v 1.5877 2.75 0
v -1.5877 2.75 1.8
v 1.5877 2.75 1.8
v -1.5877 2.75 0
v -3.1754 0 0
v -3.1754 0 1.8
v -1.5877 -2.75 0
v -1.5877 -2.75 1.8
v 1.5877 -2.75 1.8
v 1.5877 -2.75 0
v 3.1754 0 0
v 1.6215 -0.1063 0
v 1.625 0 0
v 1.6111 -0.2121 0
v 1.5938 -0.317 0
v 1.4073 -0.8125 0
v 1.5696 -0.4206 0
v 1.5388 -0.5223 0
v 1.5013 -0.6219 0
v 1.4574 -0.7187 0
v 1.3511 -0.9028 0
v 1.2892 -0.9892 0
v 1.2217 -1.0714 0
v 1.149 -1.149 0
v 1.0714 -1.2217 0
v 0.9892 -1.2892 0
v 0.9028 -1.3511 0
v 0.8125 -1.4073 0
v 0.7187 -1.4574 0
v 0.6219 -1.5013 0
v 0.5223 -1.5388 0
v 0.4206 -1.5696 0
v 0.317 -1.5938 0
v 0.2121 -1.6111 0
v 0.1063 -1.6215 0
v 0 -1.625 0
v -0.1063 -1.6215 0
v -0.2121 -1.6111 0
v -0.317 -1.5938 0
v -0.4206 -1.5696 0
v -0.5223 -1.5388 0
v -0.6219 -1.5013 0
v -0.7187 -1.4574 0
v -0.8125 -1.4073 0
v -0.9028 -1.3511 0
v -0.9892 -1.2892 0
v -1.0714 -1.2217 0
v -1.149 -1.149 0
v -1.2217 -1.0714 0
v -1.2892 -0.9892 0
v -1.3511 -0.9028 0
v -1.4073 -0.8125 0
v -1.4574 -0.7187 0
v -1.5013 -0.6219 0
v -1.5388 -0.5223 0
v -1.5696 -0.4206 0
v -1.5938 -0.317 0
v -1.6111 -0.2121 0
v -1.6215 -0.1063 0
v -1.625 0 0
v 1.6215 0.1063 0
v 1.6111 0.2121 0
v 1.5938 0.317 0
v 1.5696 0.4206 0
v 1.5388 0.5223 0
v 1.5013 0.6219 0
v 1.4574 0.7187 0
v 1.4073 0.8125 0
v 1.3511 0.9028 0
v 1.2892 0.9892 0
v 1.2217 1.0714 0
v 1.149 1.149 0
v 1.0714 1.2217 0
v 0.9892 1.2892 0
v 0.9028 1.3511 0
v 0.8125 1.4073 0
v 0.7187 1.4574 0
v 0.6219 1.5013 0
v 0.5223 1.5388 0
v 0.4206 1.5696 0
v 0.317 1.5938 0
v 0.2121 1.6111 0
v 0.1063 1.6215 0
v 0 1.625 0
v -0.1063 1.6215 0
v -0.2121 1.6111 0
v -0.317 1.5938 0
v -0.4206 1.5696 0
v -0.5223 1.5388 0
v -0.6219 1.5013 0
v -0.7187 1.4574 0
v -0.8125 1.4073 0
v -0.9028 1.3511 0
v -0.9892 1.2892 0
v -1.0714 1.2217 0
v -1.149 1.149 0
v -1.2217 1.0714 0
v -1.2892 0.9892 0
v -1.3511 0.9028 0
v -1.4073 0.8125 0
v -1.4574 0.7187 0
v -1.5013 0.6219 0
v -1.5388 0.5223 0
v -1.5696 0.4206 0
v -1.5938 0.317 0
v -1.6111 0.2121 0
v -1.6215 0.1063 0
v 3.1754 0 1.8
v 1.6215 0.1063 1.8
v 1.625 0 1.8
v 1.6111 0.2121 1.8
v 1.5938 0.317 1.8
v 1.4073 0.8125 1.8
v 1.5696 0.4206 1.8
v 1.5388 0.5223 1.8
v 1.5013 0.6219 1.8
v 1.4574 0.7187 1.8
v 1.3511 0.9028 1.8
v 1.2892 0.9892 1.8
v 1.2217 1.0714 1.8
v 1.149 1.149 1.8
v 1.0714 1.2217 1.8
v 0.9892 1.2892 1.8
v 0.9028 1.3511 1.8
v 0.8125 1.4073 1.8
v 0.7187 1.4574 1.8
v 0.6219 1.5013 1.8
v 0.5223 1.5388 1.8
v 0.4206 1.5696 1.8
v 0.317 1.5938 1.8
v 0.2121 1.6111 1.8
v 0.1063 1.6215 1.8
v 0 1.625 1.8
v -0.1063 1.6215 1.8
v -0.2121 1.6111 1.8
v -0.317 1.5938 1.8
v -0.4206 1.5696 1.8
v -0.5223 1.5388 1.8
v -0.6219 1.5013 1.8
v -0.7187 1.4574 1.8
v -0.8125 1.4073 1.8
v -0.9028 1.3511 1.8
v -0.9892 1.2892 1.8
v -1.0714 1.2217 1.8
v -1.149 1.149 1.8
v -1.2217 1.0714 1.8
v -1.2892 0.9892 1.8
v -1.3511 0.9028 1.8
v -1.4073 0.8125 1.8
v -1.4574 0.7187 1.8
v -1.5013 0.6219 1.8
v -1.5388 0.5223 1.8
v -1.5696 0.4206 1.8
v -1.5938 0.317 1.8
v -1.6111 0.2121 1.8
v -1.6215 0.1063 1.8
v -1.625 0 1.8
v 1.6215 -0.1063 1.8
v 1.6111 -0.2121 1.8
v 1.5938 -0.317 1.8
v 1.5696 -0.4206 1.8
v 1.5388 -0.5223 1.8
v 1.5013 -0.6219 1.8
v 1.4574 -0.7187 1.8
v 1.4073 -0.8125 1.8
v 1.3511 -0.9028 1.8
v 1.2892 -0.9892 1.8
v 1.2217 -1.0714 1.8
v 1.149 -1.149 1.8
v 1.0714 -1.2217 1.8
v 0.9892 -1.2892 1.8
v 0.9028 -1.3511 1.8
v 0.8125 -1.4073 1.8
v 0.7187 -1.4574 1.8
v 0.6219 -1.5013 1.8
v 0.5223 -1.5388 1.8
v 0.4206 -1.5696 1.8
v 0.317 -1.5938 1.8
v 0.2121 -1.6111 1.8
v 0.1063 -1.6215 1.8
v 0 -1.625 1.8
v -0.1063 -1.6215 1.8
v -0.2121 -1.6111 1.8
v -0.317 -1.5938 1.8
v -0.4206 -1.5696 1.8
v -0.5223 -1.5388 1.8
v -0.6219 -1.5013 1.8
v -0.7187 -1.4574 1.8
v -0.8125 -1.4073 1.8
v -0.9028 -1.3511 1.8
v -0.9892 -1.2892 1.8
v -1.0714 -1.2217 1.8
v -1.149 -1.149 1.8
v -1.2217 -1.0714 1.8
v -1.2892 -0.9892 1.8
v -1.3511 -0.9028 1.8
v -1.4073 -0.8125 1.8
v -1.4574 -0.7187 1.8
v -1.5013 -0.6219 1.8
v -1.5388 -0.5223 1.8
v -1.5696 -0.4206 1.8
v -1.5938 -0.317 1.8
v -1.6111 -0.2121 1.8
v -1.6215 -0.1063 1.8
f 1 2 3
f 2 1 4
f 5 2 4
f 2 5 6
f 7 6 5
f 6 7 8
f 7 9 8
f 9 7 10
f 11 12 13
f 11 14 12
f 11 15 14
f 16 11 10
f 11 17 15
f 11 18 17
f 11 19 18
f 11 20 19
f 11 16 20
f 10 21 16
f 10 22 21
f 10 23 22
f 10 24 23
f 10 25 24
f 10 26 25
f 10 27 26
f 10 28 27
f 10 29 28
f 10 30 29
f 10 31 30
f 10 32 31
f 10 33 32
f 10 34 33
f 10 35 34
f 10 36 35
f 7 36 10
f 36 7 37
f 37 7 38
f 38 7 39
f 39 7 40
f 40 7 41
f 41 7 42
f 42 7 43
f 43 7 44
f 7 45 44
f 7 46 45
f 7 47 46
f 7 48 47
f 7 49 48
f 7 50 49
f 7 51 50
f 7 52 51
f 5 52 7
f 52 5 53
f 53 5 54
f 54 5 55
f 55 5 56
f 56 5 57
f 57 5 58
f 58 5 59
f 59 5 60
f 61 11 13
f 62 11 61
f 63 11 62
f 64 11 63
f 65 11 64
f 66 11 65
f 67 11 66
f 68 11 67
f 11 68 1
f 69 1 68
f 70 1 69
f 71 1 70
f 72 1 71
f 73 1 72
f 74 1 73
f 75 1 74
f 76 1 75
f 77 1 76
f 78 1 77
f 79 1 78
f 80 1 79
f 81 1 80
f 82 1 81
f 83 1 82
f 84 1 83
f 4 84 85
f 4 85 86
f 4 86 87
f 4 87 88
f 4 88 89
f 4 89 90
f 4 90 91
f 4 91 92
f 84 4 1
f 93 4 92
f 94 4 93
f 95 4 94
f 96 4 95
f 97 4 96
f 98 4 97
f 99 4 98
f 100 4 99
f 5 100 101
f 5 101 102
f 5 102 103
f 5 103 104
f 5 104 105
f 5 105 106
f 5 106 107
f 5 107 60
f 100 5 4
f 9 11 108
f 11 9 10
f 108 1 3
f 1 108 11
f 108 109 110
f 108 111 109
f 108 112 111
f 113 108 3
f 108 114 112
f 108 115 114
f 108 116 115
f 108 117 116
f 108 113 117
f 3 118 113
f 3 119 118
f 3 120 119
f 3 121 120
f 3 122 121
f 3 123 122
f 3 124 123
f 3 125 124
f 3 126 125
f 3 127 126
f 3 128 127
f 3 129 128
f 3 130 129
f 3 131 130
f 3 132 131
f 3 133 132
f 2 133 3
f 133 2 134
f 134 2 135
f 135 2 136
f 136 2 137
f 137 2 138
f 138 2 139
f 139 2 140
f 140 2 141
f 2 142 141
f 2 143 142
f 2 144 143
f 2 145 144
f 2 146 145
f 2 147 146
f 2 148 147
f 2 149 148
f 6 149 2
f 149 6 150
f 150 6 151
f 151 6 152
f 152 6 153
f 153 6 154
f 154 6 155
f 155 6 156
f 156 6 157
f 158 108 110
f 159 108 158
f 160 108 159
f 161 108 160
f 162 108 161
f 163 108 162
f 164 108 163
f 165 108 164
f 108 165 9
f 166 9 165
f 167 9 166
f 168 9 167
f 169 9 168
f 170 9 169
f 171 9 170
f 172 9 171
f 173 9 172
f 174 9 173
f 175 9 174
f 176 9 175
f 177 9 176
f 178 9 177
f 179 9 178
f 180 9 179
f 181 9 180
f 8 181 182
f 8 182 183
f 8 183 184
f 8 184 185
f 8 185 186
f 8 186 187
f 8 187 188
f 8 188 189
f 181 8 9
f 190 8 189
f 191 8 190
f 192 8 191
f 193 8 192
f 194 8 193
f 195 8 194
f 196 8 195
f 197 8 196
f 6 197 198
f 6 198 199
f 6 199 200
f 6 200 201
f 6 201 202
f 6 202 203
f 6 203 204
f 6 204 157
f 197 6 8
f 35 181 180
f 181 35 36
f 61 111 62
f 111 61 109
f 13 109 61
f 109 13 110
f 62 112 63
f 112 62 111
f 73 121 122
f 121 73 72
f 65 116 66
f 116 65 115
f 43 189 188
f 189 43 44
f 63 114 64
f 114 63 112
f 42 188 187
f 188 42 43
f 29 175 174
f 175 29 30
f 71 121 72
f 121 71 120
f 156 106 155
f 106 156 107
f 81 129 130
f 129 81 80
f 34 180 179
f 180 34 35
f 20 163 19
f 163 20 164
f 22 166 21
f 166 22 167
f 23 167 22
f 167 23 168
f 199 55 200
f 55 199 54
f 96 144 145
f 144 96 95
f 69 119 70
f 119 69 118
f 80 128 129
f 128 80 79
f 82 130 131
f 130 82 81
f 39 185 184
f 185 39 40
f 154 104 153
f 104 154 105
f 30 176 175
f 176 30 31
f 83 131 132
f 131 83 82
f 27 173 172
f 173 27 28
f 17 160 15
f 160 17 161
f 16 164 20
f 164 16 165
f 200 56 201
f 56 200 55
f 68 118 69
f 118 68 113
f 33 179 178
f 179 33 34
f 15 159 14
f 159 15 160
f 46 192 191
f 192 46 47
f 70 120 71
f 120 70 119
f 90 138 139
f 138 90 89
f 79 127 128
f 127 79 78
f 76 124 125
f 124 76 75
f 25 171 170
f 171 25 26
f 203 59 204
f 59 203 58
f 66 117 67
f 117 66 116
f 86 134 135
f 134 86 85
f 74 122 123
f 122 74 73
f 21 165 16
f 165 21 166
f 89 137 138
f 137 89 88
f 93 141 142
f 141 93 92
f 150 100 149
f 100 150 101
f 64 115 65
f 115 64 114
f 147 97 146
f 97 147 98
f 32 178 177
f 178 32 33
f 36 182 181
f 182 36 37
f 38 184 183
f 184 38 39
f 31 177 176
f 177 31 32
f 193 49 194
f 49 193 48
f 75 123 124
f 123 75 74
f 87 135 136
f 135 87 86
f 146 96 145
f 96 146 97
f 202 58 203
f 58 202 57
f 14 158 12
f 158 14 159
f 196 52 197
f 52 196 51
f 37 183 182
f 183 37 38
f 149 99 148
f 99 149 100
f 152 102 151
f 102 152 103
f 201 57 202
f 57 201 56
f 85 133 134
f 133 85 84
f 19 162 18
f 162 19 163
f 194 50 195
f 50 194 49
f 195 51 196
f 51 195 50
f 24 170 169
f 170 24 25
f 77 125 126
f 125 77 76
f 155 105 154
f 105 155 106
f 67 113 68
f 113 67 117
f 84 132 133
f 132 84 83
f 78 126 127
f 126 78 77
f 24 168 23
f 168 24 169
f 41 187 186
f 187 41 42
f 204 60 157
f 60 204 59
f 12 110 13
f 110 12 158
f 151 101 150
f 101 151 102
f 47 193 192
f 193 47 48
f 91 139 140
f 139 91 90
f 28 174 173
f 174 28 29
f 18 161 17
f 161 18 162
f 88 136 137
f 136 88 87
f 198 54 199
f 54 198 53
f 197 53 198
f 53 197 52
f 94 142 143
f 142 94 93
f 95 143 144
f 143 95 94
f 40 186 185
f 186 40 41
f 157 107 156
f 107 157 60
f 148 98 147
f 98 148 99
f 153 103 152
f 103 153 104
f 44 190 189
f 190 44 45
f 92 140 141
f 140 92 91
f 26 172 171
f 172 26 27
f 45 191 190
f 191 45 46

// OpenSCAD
$fn = 96;

screw_d = 3.0;          // mm
across_flats = 5.5;     // mm
thickness = 1.8;        // mm
clearance = 0.25;       // mm (typical for printed parts)

module hex_prism(af, h) {
    // For a regular hexagon: across_flats = 2 * apothem
    // circumradius R = apothem / cos(30) = (af/2) / cos(30)
    R = (af/2) / cos(30);
    linear_extrude(height = h)
        polygon([ for (i = [0:5]) [ R*cos(60*i), R*sin(60*i) ] ]);
}

difference() {
    hex_prism(across_flats, thickness);
    translate([0,0,-0.2])
        cylinder(d = screw_d + clearance, h = thickness + 0.4);
}
